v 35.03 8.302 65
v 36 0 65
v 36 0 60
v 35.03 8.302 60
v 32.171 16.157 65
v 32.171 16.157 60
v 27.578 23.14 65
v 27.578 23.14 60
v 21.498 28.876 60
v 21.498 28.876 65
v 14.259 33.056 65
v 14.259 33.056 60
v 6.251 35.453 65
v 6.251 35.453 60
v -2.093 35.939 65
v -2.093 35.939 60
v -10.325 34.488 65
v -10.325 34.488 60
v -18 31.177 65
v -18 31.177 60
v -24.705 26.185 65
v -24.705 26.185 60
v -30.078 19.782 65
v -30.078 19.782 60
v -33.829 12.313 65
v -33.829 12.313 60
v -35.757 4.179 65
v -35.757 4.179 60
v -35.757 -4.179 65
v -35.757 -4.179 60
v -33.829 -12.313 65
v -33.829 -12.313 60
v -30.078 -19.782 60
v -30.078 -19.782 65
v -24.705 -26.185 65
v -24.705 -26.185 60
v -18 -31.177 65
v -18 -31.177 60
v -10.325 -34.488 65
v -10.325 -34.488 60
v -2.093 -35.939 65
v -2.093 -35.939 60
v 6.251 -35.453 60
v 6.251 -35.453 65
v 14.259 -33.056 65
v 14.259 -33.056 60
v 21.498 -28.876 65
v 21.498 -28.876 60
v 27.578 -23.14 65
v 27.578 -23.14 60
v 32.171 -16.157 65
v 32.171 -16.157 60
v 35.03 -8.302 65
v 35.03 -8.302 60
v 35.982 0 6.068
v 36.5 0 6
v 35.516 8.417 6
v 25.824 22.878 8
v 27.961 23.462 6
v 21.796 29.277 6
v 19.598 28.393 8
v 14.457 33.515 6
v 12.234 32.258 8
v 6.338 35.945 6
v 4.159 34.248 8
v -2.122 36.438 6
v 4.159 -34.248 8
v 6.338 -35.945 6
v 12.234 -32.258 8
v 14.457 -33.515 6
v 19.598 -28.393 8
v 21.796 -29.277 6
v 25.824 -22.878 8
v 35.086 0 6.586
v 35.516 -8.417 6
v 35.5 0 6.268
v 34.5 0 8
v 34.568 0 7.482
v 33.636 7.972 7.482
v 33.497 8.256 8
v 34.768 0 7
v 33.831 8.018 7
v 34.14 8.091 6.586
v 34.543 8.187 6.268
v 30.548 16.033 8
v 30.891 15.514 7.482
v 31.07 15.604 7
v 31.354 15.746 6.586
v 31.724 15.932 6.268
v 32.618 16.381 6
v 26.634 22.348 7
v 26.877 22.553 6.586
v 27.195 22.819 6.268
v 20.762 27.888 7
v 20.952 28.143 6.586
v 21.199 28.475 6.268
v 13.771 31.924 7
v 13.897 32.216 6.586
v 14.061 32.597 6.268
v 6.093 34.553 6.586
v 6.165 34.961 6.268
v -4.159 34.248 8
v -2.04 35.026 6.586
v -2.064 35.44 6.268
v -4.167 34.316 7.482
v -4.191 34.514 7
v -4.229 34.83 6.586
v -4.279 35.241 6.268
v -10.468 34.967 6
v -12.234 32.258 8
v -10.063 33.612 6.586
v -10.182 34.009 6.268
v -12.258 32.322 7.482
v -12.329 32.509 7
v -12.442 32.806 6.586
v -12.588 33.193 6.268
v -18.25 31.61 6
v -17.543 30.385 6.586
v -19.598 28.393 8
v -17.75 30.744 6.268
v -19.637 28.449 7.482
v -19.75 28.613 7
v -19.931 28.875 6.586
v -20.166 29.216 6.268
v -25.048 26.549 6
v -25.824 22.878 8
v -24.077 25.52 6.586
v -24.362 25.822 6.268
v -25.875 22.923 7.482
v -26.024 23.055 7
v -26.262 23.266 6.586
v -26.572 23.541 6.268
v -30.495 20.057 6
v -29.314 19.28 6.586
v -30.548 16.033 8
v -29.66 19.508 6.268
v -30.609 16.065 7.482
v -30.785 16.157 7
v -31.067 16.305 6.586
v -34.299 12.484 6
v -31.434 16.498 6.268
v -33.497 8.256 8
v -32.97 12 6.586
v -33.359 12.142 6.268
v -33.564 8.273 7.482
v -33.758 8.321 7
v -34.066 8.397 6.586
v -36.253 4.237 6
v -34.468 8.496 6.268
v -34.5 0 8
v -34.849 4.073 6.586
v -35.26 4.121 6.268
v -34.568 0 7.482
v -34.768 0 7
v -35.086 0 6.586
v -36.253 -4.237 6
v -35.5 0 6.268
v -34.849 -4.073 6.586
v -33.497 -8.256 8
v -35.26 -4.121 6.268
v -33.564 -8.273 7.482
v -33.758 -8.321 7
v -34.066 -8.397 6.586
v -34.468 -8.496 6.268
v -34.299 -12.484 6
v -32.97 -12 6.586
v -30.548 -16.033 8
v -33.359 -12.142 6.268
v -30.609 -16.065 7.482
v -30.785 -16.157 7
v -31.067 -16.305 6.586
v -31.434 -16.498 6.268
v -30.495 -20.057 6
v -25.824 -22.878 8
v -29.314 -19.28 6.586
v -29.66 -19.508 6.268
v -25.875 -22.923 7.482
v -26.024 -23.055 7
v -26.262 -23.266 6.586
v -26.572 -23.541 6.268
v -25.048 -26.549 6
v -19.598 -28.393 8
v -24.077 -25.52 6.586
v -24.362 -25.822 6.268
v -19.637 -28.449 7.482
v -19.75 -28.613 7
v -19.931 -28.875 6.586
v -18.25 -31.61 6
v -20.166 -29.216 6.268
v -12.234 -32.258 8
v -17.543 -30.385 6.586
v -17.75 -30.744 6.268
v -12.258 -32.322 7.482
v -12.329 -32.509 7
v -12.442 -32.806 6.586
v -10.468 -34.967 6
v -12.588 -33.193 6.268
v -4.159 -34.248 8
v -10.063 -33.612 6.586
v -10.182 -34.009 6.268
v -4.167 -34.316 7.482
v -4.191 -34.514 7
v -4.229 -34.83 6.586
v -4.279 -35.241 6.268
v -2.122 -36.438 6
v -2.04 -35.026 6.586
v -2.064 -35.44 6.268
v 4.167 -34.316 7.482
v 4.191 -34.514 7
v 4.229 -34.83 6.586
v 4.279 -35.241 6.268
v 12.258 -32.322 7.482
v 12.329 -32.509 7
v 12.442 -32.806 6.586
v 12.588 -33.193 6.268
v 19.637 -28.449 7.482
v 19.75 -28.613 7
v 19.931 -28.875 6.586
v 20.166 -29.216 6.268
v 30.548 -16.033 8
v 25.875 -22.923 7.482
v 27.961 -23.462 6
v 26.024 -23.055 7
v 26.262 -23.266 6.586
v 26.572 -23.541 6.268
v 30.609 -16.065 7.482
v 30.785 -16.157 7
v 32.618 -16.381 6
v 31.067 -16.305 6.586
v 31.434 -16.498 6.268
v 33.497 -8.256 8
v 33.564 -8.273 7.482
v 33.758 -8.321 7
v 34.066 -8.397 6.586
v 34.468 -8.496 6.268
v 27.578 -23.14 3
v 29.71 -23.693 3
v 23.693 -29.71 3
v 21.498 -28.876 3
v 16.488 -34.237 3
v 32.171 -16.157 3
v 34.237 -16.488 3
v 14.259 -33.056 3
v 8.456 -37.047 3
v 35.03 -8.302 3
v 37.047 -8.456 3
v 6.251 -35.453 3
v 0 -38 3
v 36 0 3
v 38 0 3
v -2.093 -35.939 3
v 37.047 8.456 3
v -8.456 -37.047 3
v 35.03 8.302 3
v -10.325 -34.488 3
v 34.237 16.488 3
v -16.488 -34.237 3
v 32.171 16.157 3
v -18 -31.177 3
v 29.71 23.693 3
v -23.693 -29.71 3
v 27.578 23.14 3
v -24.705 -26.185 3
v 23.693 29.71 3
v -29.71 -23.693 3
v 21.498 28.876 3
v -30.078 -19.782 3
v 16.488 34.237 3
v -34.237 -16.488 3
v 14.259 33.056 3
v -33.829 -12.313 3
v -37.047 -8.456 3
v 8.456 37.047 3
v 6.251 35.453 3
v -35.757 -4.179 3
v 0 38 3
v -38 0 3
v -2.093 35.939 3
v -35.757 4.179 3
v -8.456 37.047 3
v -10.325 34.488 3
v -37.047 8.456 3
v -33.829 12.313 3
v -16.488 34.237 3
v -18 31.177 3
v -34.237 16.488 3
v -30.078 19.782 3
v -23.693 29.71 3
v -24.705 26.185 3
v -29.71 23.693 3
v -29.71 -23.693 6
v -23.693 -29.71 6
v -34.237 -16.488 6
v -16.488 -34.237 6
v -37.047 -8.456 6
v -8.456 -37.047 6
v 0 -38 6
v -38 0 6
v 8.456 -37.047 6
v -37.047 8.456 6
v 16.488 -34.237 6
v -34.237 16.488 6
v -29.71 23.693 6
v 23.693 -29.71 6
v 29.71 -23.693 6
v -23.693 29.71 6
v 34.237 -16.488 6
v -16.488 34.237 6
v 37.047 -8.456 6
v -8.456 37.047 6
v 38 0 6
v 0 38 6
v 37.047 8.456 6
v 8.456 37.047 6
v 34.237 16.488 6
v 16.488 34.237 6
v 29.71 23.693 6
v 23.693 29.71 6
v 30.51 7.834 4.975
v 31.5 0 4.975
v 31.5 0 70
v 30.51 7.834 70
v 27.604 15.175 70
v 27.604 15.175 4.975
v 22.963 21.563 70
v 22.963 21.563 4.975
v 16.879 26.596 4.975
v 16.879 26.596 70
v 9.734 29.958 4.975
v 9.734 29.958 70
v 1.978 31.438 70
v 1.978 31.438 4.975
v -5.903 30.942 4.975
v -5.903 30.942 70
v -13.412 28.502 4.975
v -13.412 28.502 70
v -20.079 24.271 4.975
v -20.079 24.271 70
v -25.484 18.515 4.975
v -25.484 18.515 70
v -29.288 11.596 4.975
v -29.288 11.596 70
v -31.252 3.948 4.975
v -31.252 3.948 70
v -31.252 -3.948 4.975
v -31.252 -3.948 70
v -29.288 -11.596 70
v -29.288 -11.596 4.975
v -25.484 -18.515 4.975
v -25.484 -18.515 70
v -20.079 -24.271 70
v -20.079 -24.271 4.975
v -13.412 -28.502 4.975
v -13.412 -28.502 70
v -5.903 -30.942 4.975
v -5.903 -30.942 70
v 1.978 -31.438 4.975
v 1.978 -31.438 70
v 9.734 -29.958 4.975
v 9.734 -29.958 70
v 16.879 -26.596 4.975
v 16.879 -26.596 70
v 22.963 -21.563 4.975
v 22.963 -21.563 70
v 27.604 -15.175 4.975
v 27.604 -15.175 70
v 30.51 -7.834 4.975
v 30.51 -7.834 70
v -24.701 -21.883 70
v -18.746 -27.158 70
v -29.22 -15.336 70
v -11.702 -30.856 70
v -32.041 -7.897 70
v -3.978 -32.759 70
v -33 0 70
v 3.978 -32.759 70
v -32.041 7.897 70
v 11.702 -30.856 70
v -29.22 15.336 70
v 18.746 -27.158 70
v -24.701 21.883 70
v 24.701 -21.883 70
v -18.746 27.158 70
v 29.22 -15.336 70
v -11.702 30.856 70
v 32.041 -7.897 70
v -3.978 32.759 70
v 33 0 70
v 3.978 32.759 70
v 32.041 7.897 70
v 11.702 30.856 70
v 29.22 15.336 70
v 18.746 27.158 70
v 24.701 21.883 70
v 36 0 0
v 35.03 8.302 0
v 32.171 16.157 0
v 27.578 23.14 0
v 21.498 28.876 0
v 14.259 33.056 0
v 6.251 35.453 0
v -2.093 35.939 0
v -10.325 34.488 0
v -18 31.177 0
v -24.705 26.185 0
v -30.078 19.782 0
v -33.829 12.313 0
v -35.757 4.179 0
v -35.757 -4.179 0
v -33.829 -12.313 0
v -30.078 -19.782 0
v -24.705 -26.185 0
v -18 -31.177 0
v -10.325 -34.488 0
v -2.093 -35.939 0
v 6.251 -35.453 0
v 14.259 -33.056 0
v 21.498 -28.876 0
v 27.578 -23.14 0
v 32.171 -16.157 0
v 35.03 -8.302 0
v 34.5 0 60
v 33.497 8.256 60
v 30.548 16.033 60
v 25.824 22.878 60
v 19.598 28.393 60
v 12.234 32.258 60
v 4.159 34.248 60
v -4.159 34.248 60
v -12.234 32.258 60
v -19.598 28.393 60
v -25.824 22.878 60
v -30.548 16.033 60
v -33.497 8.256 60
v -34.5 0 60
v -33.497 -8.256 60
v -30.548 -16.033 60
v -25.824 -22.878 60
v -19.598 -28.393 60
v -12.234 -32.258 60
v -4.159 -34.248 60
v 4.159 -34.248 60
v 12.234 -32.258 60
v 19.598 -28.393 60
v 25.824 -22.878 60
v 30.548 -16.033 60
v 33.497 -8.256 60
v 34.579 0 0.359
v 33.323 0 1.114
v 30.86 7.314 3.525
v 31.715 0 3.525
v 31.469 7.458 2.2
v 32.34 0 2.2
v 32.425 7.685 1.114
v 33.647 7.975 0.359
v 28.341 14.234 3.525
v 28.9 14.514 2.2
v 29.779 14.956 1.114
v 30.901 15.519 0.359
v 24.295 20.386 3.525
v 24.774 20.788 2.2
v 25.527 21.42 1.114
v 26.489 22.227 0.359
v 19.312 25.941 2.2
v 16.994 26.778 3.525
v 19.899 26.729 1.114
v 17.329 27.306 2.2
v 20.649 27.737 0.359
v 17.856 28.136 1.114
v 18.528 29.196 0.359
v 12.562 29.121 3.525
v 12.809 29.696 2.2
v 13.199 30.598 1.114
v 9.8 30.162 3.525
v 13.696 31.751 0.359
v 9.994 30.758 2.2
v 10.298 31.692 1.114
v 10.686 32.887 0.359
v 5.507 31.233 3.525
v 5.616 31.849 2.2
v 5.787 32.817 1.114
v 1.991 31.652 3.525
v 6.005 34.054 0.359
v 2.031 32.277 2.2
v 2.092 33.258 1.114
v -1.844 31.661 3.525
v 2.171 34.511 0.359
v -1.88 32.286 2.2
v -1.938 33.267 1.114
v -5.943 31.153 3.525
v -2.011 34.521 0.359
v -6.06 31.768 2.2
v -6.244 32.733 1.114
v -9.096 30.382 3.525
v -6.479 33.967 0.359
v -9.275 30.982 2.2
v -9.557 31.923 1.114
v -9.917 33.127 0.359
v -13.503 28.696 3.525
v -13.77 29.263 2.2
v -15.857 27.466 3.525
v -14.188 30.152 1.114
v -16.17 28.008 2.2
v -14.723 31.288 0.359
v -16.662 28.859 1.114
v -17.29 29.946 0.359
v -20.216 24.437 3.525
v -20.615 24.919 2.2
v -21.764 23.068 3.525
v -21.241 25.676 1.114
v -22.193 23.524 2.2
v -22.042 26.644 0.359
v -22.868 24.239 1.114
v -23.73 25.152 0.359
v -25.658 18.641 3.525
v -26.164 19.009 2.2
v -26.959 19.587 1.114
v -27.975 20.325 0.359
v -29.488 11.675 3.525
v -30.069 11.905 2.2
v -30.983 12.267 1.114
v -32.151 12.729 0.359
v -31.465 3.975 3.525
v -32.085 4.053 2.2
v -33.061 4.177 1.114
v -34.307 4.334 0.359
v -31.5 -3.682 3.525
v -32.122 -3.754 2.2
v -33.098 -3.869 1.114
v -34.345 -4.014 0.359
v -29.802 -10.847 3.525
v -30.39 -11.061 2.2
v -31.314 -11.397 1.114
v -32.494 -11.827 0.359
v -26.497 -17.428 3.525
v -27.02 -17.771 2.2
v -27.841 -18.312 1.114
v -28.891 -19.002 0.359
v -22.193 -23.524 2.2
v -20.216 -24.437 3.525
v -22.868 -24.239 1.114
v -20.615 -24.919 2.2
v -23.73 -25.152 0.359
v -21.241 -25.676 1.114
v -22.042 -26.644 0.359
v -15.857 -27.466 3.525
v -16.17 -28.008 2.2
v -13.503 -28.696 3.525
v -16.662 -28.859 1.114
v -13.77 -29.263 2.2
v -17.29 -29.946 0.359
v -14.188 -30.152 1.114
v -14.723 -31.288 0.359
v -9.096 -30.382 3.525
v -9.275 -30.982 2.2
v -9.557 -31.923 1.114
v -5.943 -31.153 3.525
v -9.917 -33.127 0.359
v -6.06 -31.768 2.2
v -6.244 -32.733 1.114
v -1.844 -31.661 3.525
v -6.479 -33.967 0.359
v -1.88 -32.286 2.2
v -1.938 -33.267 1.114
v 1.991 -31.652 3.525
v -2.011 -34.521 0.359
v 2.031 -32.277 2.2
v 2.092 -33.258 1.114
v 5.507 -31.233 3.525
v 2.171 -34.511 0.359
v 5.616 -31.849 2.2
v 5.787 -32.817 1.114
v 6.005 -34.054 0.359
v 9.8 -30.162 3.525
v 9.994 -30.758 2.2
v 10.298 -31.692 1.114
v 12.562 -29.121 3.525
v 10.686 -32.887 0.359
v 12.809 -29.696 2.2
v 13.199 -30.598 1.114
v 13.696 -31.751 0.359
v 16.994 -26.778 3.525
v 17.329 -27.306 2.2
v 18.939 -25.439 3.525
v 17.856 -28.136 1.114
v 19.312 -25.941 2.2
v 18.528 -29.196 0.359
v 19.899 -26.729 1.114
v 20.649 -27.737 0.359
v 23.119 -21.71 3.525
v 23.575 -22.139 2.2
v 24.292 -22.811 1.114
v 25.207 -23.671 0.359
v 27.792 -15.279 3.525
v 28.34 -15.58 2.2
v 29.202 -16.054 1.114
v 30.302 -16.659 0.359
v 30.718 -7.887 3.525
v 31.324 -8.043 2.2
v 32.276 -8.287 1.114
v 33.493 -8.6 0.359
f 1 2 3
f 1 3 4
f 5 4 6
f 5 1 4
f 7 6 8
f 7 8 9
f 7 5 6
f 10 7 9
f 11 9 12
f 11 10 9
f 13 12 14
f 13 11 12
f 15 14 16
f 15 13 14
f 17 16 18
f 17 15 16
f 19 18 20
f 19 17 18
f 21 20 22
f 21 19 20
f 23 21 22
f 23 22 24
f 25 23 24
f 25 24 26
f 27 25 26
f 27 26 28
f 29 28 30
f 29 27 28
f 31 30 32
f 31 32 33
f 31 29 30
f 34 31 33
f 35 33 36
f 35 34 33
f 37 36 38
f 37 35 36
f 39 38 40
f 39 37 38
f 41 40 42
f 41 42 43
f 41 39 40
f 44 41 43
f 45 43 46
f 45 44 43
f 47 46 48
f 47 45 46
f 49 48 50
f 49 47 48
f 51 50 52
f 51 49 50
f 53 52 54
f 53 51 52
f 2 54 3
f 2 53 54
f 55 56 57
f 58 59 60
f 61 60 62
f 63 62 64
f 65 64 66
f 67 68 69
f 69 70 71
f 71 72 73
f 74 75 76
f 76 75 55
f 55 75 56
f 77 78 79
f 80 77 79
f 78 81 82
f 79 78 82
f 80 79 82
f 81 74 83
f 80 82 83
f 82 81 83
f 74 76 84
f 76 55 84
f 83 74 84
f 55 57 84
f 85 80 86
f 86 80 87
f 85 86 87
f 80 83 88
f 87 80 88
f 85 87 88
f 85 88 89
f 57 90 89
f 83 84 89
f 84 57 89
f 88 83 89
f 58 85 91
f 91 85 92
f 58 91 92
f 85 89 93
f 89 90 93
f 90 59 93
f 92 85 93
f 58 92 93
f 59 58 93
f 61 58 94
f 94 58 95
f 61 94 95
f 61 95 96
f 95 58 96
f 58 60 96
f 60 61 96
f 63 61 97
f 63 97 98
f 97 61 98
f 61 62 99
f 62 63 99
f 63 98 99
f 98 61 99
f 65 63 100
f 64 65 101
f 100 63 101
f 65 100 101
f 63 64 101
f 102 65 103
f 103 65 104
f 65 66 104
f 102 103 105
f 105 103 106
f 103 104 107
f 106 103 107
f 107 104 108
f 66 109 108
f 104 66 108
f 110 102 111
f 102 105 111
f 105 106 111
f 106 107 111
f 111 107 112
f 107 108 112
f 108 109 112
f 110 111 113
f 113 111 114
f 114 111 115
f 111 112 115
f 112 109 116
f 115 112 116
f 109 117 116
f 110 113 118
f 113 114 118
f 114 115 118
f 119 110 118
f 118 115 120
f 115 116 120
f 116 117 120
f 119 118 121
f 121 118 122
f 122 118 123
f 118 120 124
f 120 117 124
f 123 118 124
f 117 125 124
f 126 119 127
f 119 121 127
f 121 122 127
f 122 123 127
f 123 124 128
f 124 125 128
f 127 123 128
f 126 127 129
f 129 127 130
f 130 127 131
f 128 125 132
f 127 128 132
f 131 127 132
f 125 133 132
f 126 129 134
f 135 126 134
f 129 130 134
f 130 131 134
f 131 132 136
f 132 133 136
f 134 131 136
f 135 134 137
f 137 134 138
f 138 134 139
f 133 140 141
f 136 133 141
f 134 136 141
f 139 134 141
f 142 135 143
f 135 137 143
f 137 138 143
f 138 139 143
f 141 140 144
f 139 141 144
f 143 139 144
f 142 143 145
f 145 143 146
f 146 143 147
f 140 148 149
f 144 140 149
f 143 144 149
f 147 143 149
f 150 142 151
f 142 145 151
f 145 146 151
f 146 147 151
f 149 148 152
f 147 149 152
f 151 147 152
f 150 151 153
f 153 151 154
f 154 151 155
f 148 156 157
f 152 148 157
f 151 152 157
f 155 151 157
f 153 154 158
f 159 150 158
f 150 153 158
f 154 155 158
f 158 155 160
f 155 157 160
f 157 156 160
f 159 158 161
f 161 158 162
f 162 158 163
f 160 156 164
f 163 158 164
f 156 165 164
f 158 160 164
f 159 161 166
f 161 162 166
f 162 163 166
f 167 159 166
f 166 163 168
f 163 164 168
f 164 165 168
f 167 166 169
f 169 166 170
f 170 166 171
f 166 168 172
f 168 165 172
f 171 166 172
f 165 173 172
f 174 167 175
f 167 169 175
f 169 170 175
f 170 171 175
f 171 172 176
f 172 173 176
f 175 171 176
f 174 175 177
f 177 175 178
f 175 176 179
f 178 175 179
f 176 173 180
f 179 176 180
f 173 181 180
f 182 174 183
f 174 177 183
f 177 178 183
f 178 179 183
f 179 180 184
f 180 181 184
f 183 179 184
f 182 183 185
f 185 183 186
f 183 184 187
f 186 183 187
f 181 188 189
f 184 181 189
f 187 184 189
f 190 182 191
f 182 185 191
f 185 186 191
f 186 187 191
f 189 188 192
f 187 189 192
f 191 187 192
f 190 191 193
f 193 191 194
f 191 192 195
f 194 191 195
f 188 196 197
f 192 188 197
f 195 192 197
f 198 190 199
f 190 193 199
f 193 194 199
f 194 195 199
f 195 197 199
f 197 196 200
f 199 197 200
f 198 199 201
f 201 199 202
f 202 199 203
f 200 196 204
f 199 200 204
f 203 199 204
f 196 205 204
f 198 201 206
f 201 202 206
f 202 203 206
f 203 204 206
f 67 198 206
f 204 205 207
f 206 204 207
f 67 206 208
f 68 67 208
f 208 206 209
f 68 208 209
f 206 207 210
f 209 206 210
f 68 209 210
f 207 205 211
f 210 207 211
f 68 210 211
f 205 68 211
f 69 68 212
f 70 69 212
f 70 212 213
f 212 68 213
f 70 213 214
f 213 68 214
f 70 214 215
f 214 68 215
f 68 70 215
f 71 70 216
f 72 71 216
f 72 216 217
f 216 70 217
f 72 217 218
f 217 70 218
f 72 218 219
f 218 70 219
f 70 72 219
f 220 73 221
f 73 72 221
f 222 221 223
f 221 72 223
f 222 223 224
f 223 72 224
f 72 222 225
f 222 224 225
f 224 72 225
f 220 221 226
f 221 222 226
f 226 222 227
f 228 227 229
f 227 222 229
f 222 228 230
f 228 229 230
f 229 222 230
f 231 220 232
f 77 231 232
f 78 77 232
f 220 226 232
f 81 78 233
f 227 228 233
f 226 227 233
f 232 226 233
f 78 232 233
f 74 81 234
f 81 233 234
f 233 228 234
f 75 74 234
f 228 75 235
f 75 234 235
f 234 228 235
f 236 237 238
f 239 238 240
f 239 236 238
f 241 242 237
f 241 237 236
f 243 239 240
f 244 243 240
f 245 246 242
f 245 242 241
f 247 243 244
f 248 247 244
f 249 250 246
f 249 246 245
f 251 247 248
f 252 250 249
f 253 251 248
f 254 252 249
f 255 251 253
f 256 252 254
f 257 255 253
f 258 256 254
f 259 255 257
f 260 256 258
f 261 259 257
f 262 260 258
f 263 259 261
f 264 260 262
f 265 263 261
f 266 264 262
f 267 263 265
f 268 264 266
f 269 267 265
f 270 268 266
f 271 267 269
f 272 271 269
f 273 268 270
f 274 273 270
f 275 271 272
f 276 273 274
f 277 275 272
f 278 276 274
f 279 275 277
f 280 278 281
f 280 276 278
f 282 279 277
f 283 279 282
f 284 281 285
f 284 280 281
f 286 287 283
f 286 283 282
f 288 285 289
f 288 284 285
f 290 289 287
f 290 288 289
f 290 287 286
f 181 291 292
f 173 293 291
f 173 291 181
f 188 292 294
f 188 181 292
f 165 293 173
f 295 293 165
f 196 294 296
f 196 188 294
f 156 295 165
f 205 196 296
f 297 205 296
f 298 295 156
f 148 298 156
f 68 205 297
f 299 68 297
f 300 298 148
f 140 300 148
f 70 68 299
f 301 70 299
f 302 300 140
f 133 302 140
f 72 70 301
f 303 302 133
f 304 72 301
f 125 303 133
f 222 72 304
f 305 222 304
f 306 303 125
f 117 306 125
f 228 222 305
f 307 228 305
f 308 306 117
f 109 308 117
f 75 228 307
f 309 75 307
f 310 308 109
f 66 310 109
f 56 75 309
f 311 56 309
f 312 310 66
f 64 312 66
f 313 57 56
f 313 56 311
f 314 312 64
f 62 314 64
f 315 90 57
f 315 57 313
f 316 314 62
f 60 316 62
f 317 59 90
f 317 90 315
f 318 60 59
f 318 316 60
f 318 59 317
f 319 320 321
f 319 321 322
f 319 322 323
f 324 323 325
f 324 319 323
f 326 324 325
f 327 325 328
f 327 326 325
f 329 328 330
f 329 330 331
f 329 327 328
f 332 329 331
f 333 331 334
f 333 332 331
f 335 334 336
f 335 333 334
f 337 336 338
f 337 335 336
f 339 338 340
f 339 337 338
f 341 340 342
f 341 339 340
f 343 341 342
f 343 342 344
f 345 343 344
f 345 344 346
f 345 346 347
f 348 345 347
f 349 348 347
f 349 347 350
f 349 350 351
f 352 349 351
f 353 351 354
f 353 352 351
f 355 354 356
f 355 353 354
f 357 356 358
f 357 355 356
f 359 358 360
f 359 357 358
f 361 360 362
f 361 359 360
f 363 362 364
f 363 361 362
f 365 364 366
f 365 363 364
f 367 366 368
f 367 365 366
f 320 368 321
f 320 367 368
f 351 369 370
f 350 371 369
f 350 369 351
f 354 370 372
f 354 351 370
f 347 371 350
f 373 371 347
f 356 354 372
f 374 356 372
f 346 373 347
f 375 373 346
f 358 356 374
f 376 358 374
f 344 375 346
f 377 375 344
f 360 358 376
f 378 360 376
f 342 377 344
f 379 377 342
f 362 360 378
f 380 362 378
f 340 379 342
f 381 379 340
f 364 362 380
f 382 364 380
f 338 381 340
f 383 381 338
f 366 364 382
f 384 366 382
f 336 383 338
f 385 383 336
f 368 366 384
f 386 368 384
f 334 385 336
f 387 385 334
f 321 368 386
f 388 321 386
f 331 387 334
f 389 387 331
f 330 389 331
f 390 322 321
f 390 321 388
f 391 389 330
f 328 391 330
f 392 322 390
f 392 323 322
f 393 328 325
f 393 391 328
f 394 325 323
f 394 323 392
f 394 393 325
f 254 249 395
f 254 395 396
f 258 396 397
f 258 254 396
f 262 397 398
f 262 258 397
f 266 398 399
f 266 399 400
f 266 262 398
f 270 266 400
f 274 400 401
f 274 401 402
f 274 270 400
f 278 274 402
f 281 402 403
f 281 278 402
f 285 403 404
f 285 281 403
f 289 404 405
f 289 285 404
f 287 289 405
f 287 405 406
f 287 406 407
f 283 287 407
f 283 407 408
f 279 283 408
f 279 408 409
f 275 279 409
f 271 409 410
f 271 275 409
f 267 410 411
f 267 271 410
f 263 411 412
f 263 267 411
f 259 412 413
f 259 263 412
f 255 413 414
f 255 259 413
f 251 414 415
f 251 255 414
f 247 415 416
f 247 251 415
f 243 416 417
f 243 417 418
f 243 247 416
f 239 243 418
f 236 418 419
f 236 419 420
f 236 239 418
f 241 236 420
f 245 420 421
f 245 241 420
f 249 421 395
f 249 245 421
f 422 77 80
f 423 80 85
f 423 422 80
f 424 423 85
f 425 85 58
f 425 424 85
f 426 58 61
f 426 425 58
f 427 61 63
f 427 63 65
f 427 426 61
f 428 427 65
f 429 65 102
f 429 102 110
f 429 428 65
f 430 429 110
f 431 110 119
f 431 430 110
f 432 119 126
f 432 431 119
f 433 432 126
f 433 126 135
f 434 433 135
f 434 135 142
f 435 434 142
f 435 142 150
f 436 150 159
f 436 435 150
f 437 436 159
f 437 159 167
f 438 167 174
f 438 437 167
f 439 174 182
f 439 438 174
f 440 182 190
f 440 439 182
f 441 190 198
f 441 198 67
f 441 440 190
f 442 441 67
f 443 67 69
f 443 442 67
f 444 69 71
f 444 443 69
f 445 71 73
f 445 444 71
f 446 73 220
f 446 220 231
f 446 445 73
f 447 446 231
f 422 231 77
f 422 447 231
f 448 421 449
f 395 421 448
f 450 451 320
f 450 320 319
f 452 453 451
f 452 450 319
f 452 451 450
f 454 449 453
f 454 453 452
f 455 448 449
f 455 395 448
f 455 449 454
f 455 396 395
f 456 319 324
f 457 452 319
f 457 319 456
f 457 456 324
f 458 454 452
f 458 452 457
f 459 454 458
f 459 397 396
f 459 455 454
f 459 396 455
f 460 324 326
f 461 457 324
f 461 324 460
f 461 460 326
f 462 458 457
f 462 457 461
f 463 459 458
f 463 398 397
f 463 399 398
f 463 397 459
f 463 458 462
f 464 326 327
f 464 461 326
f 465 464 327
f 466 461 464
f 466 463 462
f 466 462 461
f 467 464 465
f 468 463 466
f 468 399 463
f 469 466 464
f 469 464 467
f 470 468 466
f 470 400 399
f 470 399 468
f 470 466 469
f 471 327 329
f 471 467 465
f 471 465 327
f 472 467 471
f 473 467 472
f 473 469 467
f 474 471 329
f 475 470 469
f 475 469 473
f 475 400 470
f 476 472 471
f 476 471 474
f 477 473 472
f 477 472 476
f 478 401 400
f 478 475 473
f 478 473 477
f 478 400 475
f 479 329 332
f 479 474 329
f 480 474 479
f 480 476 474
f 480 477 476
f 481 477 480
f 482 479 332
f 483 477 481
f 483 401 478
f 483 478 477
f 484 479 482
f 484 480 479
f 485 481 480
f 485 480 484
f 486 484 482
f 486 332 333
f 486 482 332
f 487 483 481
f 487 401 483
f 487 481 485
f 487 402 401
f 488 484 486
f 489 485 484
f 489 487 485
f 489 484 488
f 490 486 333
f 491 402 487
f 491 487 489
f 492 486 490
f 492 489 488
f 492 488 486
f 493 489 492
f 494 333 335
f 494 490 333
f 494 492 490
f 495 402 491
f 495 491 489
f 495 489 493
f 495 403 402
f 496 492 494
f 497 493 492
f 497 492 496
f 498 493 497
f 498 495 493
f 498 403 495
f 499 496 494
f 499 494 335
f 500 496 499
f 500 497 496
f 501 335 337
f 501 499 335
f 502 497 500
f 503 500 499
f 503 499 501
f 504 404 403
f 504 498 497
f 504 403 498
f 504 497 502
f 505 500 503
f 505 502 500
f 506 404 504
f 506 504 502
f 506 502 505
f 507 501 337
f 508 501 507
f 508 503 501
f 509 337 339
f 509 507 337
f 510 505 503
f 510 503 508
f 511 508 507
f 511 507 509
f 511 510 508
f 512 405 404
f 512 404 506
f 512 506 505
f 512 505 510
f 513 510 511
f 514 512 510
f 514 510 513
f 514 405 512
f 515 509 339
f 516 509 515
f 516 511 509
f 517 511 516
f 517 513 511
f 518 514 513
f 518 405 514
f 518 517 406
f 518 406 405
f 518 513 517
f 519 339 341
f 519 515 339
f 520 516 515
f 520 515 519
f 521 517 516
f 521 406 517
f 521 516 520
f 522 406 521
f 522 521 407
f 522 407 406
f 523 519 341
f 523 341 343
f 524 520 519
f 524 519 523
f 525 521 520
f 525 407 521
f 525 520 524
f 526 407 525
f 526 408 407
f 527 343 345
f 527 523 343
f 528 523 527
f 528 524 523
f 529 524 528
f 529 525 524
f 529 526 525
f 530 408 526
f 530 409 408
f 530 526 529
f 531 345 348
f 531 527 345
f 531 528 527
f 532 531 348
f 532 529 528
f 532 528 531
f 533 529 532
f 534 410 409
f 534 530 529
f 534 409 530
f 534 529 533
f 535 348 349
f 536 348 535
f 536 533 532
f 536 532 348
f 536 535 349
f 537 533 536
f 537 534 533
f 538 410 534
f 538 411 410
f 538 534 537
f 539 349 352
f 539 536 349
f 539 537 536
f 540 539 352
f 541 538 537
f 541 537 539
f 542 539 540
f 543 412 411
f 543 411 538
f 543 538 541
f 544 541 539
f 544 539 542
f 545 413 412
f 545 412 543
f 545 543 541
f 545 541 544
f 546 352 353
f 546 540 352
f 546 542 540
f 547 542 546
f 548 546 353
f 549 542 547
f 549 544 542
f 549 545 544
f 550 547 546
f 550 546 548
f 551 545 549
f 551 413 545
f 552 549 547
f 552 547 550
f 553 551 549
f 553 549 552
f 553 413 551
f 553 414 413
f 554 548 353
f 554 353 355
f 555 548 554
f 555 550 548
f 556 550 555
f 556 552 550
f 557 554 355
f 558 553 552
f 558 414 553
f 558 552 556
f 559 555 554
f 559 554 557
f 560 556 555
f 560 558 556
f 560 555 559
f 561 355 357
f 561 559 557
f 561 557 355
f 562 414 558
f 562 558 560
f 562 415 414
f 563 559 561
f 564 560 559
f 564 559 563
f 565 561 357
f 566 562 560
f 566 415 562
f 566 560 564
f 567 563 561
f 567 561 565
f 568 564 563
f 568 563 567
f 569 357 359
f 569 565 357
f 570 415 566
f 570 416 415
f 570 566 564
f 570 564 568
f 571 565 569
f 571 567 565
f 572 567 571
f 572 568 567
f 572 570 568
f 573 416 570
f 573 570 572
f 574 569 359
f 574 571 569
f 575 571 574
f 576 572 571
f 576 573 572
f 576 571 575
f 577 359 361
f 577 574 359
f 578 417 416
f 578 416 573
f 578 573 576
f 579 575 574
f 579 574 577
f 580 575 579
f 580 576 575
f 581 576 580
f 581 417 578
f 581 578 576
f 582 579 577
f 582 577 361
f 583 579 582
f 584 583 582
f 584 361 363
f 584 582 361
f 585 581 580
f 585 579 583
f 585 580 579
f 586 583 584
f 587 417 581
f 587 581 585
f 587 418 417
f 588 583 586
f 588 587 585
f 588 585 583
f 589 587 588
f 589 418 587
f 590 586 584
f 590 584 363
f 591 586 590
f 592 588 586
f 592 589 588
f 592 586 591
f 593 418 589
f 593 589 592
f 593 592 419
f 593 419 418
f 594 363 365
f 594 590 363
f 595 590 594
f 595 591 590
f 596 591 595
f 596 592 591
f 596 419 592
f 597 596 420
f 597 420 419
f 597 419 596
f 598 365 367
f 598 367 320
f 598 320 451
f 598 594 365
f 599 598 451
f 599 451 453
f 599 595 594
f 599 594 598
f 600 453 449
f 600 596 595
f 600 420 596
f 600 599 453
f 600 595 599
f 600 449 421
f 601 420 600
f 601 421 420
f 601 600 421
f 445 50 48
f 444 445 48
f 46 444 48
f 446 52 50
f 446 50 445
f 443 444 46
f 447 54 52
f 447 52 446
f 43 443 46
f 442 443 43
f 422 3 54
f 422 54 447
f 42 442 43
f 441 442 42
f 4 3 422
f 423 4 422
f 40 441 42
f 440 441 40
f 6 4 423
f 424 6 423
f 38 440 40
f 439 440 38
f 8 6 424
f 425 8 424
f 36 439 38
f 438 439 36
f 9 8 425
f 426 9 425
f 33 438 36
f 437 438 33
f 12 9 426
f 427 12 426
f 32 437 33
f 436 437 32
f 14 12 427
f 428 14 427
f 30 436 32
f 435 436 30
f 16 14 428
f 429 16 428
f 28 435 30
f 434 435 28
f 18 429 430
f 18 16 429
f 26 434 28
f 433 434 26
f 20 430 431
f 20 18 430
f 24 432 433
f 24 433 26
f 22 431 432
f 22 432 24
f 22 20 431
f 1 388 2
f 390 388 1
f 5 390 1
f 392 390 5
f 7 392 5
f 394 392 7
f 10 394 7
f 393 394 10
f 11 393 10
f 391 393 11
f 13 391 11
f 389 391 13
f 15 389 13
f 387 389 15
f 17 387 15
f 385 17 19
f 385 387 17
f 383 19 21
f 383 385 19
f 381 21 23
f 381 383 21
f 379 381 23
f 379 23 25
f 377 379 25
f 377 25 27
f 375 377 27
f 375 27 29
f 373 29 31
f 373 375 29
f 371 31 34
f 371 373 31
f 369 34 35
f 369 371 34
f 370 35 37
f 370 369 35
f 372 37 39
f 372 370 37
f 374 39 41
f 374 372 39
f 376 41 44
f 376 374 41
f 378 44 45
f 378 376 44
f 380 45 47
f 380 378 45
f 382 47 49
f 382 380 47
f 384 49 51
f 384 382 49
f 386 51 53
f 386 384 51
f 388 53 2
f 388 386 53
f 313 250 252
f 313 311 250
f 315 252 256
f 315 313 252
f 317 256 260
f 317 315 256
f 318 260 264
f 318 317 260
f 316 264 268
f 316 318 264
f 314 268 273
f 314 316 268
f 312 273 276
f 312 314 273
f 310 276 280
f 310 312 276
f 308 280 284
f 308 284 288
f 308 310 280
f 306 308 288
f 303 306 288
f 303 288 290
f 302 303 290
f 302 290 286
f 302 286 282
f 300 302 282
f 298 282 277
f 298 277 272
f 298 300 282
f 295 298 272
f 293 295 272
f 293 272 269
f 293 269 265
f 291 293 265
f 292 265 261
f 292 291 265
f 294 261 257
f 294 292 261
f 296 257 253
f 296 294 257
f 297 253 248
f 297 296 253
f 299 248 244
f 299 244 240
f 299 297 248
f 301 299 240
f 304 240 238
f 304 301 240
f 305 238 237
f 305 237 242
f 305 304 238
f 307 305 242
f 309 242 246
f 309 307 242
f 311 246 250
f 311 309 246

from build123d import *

# Parameters (mm, degrees)
F2_SIZE2 = 3
F2_SIZE  = 5
F3_R     = 2


# Not quite as in the source:
# - a fillet or chamfer that OpenCascade refuses, or shapes differently, is made with other operations: its cross-section is extruded or revolved along the edge and cut away or added


with BuildPart() as f1:
    # F0 (on Front) → F1 (revolve)
    with BuildSketch(Plane.XZ):
        Polygon((34.5, 70), (31.5, 70), (31.5, 0), (36, 0), (36, 3), (38, 3), (38, 6), (34.5, 6), (34.5, 60), (36, 60), (36, 70), align=None)
    revolve(axis=Axis((0, 0, 35), (0, 0, 1)))

    # F2
    f2_edges = [f1.edges().sort_by_distance(p)[0] for p in [
        (-36, 0, 70),
    ]]
    f2_side = f1.faces().sort_by_distance((-36, 0, 65))[0]
    chamfer(f2_edges, length=F2_SIZE, length2=F2_SIZE2, reference=f2_side)

    # F3
    f3_edges = [f1.edges().sort_by_distance(p)[0] for p in [
        (-34.5, 0, 6),
    ]]
    fillet(f3_edges, radius=F3_R)

    # F4: fillet of radius 5 on 1 edges, made by hand

    # F4_s1 → F4_t2 (revolve, cut)
    with BuildSketch(Plane.XZ):
        with BuildLine():
            ThreePointArc((31.5, 4.9749371855), (32.7919007565, 1.6208352193), (36, 0))
            Line((36, 0), (31.5, 0))
            Line((31.5, 0), (31.5, 4.9749371855))
        make_face()
    revolve(axis=Axis((0, 0, 0), (0, 0, 1)), mode=Mode.SUBTRACT)


solid = f1.part
